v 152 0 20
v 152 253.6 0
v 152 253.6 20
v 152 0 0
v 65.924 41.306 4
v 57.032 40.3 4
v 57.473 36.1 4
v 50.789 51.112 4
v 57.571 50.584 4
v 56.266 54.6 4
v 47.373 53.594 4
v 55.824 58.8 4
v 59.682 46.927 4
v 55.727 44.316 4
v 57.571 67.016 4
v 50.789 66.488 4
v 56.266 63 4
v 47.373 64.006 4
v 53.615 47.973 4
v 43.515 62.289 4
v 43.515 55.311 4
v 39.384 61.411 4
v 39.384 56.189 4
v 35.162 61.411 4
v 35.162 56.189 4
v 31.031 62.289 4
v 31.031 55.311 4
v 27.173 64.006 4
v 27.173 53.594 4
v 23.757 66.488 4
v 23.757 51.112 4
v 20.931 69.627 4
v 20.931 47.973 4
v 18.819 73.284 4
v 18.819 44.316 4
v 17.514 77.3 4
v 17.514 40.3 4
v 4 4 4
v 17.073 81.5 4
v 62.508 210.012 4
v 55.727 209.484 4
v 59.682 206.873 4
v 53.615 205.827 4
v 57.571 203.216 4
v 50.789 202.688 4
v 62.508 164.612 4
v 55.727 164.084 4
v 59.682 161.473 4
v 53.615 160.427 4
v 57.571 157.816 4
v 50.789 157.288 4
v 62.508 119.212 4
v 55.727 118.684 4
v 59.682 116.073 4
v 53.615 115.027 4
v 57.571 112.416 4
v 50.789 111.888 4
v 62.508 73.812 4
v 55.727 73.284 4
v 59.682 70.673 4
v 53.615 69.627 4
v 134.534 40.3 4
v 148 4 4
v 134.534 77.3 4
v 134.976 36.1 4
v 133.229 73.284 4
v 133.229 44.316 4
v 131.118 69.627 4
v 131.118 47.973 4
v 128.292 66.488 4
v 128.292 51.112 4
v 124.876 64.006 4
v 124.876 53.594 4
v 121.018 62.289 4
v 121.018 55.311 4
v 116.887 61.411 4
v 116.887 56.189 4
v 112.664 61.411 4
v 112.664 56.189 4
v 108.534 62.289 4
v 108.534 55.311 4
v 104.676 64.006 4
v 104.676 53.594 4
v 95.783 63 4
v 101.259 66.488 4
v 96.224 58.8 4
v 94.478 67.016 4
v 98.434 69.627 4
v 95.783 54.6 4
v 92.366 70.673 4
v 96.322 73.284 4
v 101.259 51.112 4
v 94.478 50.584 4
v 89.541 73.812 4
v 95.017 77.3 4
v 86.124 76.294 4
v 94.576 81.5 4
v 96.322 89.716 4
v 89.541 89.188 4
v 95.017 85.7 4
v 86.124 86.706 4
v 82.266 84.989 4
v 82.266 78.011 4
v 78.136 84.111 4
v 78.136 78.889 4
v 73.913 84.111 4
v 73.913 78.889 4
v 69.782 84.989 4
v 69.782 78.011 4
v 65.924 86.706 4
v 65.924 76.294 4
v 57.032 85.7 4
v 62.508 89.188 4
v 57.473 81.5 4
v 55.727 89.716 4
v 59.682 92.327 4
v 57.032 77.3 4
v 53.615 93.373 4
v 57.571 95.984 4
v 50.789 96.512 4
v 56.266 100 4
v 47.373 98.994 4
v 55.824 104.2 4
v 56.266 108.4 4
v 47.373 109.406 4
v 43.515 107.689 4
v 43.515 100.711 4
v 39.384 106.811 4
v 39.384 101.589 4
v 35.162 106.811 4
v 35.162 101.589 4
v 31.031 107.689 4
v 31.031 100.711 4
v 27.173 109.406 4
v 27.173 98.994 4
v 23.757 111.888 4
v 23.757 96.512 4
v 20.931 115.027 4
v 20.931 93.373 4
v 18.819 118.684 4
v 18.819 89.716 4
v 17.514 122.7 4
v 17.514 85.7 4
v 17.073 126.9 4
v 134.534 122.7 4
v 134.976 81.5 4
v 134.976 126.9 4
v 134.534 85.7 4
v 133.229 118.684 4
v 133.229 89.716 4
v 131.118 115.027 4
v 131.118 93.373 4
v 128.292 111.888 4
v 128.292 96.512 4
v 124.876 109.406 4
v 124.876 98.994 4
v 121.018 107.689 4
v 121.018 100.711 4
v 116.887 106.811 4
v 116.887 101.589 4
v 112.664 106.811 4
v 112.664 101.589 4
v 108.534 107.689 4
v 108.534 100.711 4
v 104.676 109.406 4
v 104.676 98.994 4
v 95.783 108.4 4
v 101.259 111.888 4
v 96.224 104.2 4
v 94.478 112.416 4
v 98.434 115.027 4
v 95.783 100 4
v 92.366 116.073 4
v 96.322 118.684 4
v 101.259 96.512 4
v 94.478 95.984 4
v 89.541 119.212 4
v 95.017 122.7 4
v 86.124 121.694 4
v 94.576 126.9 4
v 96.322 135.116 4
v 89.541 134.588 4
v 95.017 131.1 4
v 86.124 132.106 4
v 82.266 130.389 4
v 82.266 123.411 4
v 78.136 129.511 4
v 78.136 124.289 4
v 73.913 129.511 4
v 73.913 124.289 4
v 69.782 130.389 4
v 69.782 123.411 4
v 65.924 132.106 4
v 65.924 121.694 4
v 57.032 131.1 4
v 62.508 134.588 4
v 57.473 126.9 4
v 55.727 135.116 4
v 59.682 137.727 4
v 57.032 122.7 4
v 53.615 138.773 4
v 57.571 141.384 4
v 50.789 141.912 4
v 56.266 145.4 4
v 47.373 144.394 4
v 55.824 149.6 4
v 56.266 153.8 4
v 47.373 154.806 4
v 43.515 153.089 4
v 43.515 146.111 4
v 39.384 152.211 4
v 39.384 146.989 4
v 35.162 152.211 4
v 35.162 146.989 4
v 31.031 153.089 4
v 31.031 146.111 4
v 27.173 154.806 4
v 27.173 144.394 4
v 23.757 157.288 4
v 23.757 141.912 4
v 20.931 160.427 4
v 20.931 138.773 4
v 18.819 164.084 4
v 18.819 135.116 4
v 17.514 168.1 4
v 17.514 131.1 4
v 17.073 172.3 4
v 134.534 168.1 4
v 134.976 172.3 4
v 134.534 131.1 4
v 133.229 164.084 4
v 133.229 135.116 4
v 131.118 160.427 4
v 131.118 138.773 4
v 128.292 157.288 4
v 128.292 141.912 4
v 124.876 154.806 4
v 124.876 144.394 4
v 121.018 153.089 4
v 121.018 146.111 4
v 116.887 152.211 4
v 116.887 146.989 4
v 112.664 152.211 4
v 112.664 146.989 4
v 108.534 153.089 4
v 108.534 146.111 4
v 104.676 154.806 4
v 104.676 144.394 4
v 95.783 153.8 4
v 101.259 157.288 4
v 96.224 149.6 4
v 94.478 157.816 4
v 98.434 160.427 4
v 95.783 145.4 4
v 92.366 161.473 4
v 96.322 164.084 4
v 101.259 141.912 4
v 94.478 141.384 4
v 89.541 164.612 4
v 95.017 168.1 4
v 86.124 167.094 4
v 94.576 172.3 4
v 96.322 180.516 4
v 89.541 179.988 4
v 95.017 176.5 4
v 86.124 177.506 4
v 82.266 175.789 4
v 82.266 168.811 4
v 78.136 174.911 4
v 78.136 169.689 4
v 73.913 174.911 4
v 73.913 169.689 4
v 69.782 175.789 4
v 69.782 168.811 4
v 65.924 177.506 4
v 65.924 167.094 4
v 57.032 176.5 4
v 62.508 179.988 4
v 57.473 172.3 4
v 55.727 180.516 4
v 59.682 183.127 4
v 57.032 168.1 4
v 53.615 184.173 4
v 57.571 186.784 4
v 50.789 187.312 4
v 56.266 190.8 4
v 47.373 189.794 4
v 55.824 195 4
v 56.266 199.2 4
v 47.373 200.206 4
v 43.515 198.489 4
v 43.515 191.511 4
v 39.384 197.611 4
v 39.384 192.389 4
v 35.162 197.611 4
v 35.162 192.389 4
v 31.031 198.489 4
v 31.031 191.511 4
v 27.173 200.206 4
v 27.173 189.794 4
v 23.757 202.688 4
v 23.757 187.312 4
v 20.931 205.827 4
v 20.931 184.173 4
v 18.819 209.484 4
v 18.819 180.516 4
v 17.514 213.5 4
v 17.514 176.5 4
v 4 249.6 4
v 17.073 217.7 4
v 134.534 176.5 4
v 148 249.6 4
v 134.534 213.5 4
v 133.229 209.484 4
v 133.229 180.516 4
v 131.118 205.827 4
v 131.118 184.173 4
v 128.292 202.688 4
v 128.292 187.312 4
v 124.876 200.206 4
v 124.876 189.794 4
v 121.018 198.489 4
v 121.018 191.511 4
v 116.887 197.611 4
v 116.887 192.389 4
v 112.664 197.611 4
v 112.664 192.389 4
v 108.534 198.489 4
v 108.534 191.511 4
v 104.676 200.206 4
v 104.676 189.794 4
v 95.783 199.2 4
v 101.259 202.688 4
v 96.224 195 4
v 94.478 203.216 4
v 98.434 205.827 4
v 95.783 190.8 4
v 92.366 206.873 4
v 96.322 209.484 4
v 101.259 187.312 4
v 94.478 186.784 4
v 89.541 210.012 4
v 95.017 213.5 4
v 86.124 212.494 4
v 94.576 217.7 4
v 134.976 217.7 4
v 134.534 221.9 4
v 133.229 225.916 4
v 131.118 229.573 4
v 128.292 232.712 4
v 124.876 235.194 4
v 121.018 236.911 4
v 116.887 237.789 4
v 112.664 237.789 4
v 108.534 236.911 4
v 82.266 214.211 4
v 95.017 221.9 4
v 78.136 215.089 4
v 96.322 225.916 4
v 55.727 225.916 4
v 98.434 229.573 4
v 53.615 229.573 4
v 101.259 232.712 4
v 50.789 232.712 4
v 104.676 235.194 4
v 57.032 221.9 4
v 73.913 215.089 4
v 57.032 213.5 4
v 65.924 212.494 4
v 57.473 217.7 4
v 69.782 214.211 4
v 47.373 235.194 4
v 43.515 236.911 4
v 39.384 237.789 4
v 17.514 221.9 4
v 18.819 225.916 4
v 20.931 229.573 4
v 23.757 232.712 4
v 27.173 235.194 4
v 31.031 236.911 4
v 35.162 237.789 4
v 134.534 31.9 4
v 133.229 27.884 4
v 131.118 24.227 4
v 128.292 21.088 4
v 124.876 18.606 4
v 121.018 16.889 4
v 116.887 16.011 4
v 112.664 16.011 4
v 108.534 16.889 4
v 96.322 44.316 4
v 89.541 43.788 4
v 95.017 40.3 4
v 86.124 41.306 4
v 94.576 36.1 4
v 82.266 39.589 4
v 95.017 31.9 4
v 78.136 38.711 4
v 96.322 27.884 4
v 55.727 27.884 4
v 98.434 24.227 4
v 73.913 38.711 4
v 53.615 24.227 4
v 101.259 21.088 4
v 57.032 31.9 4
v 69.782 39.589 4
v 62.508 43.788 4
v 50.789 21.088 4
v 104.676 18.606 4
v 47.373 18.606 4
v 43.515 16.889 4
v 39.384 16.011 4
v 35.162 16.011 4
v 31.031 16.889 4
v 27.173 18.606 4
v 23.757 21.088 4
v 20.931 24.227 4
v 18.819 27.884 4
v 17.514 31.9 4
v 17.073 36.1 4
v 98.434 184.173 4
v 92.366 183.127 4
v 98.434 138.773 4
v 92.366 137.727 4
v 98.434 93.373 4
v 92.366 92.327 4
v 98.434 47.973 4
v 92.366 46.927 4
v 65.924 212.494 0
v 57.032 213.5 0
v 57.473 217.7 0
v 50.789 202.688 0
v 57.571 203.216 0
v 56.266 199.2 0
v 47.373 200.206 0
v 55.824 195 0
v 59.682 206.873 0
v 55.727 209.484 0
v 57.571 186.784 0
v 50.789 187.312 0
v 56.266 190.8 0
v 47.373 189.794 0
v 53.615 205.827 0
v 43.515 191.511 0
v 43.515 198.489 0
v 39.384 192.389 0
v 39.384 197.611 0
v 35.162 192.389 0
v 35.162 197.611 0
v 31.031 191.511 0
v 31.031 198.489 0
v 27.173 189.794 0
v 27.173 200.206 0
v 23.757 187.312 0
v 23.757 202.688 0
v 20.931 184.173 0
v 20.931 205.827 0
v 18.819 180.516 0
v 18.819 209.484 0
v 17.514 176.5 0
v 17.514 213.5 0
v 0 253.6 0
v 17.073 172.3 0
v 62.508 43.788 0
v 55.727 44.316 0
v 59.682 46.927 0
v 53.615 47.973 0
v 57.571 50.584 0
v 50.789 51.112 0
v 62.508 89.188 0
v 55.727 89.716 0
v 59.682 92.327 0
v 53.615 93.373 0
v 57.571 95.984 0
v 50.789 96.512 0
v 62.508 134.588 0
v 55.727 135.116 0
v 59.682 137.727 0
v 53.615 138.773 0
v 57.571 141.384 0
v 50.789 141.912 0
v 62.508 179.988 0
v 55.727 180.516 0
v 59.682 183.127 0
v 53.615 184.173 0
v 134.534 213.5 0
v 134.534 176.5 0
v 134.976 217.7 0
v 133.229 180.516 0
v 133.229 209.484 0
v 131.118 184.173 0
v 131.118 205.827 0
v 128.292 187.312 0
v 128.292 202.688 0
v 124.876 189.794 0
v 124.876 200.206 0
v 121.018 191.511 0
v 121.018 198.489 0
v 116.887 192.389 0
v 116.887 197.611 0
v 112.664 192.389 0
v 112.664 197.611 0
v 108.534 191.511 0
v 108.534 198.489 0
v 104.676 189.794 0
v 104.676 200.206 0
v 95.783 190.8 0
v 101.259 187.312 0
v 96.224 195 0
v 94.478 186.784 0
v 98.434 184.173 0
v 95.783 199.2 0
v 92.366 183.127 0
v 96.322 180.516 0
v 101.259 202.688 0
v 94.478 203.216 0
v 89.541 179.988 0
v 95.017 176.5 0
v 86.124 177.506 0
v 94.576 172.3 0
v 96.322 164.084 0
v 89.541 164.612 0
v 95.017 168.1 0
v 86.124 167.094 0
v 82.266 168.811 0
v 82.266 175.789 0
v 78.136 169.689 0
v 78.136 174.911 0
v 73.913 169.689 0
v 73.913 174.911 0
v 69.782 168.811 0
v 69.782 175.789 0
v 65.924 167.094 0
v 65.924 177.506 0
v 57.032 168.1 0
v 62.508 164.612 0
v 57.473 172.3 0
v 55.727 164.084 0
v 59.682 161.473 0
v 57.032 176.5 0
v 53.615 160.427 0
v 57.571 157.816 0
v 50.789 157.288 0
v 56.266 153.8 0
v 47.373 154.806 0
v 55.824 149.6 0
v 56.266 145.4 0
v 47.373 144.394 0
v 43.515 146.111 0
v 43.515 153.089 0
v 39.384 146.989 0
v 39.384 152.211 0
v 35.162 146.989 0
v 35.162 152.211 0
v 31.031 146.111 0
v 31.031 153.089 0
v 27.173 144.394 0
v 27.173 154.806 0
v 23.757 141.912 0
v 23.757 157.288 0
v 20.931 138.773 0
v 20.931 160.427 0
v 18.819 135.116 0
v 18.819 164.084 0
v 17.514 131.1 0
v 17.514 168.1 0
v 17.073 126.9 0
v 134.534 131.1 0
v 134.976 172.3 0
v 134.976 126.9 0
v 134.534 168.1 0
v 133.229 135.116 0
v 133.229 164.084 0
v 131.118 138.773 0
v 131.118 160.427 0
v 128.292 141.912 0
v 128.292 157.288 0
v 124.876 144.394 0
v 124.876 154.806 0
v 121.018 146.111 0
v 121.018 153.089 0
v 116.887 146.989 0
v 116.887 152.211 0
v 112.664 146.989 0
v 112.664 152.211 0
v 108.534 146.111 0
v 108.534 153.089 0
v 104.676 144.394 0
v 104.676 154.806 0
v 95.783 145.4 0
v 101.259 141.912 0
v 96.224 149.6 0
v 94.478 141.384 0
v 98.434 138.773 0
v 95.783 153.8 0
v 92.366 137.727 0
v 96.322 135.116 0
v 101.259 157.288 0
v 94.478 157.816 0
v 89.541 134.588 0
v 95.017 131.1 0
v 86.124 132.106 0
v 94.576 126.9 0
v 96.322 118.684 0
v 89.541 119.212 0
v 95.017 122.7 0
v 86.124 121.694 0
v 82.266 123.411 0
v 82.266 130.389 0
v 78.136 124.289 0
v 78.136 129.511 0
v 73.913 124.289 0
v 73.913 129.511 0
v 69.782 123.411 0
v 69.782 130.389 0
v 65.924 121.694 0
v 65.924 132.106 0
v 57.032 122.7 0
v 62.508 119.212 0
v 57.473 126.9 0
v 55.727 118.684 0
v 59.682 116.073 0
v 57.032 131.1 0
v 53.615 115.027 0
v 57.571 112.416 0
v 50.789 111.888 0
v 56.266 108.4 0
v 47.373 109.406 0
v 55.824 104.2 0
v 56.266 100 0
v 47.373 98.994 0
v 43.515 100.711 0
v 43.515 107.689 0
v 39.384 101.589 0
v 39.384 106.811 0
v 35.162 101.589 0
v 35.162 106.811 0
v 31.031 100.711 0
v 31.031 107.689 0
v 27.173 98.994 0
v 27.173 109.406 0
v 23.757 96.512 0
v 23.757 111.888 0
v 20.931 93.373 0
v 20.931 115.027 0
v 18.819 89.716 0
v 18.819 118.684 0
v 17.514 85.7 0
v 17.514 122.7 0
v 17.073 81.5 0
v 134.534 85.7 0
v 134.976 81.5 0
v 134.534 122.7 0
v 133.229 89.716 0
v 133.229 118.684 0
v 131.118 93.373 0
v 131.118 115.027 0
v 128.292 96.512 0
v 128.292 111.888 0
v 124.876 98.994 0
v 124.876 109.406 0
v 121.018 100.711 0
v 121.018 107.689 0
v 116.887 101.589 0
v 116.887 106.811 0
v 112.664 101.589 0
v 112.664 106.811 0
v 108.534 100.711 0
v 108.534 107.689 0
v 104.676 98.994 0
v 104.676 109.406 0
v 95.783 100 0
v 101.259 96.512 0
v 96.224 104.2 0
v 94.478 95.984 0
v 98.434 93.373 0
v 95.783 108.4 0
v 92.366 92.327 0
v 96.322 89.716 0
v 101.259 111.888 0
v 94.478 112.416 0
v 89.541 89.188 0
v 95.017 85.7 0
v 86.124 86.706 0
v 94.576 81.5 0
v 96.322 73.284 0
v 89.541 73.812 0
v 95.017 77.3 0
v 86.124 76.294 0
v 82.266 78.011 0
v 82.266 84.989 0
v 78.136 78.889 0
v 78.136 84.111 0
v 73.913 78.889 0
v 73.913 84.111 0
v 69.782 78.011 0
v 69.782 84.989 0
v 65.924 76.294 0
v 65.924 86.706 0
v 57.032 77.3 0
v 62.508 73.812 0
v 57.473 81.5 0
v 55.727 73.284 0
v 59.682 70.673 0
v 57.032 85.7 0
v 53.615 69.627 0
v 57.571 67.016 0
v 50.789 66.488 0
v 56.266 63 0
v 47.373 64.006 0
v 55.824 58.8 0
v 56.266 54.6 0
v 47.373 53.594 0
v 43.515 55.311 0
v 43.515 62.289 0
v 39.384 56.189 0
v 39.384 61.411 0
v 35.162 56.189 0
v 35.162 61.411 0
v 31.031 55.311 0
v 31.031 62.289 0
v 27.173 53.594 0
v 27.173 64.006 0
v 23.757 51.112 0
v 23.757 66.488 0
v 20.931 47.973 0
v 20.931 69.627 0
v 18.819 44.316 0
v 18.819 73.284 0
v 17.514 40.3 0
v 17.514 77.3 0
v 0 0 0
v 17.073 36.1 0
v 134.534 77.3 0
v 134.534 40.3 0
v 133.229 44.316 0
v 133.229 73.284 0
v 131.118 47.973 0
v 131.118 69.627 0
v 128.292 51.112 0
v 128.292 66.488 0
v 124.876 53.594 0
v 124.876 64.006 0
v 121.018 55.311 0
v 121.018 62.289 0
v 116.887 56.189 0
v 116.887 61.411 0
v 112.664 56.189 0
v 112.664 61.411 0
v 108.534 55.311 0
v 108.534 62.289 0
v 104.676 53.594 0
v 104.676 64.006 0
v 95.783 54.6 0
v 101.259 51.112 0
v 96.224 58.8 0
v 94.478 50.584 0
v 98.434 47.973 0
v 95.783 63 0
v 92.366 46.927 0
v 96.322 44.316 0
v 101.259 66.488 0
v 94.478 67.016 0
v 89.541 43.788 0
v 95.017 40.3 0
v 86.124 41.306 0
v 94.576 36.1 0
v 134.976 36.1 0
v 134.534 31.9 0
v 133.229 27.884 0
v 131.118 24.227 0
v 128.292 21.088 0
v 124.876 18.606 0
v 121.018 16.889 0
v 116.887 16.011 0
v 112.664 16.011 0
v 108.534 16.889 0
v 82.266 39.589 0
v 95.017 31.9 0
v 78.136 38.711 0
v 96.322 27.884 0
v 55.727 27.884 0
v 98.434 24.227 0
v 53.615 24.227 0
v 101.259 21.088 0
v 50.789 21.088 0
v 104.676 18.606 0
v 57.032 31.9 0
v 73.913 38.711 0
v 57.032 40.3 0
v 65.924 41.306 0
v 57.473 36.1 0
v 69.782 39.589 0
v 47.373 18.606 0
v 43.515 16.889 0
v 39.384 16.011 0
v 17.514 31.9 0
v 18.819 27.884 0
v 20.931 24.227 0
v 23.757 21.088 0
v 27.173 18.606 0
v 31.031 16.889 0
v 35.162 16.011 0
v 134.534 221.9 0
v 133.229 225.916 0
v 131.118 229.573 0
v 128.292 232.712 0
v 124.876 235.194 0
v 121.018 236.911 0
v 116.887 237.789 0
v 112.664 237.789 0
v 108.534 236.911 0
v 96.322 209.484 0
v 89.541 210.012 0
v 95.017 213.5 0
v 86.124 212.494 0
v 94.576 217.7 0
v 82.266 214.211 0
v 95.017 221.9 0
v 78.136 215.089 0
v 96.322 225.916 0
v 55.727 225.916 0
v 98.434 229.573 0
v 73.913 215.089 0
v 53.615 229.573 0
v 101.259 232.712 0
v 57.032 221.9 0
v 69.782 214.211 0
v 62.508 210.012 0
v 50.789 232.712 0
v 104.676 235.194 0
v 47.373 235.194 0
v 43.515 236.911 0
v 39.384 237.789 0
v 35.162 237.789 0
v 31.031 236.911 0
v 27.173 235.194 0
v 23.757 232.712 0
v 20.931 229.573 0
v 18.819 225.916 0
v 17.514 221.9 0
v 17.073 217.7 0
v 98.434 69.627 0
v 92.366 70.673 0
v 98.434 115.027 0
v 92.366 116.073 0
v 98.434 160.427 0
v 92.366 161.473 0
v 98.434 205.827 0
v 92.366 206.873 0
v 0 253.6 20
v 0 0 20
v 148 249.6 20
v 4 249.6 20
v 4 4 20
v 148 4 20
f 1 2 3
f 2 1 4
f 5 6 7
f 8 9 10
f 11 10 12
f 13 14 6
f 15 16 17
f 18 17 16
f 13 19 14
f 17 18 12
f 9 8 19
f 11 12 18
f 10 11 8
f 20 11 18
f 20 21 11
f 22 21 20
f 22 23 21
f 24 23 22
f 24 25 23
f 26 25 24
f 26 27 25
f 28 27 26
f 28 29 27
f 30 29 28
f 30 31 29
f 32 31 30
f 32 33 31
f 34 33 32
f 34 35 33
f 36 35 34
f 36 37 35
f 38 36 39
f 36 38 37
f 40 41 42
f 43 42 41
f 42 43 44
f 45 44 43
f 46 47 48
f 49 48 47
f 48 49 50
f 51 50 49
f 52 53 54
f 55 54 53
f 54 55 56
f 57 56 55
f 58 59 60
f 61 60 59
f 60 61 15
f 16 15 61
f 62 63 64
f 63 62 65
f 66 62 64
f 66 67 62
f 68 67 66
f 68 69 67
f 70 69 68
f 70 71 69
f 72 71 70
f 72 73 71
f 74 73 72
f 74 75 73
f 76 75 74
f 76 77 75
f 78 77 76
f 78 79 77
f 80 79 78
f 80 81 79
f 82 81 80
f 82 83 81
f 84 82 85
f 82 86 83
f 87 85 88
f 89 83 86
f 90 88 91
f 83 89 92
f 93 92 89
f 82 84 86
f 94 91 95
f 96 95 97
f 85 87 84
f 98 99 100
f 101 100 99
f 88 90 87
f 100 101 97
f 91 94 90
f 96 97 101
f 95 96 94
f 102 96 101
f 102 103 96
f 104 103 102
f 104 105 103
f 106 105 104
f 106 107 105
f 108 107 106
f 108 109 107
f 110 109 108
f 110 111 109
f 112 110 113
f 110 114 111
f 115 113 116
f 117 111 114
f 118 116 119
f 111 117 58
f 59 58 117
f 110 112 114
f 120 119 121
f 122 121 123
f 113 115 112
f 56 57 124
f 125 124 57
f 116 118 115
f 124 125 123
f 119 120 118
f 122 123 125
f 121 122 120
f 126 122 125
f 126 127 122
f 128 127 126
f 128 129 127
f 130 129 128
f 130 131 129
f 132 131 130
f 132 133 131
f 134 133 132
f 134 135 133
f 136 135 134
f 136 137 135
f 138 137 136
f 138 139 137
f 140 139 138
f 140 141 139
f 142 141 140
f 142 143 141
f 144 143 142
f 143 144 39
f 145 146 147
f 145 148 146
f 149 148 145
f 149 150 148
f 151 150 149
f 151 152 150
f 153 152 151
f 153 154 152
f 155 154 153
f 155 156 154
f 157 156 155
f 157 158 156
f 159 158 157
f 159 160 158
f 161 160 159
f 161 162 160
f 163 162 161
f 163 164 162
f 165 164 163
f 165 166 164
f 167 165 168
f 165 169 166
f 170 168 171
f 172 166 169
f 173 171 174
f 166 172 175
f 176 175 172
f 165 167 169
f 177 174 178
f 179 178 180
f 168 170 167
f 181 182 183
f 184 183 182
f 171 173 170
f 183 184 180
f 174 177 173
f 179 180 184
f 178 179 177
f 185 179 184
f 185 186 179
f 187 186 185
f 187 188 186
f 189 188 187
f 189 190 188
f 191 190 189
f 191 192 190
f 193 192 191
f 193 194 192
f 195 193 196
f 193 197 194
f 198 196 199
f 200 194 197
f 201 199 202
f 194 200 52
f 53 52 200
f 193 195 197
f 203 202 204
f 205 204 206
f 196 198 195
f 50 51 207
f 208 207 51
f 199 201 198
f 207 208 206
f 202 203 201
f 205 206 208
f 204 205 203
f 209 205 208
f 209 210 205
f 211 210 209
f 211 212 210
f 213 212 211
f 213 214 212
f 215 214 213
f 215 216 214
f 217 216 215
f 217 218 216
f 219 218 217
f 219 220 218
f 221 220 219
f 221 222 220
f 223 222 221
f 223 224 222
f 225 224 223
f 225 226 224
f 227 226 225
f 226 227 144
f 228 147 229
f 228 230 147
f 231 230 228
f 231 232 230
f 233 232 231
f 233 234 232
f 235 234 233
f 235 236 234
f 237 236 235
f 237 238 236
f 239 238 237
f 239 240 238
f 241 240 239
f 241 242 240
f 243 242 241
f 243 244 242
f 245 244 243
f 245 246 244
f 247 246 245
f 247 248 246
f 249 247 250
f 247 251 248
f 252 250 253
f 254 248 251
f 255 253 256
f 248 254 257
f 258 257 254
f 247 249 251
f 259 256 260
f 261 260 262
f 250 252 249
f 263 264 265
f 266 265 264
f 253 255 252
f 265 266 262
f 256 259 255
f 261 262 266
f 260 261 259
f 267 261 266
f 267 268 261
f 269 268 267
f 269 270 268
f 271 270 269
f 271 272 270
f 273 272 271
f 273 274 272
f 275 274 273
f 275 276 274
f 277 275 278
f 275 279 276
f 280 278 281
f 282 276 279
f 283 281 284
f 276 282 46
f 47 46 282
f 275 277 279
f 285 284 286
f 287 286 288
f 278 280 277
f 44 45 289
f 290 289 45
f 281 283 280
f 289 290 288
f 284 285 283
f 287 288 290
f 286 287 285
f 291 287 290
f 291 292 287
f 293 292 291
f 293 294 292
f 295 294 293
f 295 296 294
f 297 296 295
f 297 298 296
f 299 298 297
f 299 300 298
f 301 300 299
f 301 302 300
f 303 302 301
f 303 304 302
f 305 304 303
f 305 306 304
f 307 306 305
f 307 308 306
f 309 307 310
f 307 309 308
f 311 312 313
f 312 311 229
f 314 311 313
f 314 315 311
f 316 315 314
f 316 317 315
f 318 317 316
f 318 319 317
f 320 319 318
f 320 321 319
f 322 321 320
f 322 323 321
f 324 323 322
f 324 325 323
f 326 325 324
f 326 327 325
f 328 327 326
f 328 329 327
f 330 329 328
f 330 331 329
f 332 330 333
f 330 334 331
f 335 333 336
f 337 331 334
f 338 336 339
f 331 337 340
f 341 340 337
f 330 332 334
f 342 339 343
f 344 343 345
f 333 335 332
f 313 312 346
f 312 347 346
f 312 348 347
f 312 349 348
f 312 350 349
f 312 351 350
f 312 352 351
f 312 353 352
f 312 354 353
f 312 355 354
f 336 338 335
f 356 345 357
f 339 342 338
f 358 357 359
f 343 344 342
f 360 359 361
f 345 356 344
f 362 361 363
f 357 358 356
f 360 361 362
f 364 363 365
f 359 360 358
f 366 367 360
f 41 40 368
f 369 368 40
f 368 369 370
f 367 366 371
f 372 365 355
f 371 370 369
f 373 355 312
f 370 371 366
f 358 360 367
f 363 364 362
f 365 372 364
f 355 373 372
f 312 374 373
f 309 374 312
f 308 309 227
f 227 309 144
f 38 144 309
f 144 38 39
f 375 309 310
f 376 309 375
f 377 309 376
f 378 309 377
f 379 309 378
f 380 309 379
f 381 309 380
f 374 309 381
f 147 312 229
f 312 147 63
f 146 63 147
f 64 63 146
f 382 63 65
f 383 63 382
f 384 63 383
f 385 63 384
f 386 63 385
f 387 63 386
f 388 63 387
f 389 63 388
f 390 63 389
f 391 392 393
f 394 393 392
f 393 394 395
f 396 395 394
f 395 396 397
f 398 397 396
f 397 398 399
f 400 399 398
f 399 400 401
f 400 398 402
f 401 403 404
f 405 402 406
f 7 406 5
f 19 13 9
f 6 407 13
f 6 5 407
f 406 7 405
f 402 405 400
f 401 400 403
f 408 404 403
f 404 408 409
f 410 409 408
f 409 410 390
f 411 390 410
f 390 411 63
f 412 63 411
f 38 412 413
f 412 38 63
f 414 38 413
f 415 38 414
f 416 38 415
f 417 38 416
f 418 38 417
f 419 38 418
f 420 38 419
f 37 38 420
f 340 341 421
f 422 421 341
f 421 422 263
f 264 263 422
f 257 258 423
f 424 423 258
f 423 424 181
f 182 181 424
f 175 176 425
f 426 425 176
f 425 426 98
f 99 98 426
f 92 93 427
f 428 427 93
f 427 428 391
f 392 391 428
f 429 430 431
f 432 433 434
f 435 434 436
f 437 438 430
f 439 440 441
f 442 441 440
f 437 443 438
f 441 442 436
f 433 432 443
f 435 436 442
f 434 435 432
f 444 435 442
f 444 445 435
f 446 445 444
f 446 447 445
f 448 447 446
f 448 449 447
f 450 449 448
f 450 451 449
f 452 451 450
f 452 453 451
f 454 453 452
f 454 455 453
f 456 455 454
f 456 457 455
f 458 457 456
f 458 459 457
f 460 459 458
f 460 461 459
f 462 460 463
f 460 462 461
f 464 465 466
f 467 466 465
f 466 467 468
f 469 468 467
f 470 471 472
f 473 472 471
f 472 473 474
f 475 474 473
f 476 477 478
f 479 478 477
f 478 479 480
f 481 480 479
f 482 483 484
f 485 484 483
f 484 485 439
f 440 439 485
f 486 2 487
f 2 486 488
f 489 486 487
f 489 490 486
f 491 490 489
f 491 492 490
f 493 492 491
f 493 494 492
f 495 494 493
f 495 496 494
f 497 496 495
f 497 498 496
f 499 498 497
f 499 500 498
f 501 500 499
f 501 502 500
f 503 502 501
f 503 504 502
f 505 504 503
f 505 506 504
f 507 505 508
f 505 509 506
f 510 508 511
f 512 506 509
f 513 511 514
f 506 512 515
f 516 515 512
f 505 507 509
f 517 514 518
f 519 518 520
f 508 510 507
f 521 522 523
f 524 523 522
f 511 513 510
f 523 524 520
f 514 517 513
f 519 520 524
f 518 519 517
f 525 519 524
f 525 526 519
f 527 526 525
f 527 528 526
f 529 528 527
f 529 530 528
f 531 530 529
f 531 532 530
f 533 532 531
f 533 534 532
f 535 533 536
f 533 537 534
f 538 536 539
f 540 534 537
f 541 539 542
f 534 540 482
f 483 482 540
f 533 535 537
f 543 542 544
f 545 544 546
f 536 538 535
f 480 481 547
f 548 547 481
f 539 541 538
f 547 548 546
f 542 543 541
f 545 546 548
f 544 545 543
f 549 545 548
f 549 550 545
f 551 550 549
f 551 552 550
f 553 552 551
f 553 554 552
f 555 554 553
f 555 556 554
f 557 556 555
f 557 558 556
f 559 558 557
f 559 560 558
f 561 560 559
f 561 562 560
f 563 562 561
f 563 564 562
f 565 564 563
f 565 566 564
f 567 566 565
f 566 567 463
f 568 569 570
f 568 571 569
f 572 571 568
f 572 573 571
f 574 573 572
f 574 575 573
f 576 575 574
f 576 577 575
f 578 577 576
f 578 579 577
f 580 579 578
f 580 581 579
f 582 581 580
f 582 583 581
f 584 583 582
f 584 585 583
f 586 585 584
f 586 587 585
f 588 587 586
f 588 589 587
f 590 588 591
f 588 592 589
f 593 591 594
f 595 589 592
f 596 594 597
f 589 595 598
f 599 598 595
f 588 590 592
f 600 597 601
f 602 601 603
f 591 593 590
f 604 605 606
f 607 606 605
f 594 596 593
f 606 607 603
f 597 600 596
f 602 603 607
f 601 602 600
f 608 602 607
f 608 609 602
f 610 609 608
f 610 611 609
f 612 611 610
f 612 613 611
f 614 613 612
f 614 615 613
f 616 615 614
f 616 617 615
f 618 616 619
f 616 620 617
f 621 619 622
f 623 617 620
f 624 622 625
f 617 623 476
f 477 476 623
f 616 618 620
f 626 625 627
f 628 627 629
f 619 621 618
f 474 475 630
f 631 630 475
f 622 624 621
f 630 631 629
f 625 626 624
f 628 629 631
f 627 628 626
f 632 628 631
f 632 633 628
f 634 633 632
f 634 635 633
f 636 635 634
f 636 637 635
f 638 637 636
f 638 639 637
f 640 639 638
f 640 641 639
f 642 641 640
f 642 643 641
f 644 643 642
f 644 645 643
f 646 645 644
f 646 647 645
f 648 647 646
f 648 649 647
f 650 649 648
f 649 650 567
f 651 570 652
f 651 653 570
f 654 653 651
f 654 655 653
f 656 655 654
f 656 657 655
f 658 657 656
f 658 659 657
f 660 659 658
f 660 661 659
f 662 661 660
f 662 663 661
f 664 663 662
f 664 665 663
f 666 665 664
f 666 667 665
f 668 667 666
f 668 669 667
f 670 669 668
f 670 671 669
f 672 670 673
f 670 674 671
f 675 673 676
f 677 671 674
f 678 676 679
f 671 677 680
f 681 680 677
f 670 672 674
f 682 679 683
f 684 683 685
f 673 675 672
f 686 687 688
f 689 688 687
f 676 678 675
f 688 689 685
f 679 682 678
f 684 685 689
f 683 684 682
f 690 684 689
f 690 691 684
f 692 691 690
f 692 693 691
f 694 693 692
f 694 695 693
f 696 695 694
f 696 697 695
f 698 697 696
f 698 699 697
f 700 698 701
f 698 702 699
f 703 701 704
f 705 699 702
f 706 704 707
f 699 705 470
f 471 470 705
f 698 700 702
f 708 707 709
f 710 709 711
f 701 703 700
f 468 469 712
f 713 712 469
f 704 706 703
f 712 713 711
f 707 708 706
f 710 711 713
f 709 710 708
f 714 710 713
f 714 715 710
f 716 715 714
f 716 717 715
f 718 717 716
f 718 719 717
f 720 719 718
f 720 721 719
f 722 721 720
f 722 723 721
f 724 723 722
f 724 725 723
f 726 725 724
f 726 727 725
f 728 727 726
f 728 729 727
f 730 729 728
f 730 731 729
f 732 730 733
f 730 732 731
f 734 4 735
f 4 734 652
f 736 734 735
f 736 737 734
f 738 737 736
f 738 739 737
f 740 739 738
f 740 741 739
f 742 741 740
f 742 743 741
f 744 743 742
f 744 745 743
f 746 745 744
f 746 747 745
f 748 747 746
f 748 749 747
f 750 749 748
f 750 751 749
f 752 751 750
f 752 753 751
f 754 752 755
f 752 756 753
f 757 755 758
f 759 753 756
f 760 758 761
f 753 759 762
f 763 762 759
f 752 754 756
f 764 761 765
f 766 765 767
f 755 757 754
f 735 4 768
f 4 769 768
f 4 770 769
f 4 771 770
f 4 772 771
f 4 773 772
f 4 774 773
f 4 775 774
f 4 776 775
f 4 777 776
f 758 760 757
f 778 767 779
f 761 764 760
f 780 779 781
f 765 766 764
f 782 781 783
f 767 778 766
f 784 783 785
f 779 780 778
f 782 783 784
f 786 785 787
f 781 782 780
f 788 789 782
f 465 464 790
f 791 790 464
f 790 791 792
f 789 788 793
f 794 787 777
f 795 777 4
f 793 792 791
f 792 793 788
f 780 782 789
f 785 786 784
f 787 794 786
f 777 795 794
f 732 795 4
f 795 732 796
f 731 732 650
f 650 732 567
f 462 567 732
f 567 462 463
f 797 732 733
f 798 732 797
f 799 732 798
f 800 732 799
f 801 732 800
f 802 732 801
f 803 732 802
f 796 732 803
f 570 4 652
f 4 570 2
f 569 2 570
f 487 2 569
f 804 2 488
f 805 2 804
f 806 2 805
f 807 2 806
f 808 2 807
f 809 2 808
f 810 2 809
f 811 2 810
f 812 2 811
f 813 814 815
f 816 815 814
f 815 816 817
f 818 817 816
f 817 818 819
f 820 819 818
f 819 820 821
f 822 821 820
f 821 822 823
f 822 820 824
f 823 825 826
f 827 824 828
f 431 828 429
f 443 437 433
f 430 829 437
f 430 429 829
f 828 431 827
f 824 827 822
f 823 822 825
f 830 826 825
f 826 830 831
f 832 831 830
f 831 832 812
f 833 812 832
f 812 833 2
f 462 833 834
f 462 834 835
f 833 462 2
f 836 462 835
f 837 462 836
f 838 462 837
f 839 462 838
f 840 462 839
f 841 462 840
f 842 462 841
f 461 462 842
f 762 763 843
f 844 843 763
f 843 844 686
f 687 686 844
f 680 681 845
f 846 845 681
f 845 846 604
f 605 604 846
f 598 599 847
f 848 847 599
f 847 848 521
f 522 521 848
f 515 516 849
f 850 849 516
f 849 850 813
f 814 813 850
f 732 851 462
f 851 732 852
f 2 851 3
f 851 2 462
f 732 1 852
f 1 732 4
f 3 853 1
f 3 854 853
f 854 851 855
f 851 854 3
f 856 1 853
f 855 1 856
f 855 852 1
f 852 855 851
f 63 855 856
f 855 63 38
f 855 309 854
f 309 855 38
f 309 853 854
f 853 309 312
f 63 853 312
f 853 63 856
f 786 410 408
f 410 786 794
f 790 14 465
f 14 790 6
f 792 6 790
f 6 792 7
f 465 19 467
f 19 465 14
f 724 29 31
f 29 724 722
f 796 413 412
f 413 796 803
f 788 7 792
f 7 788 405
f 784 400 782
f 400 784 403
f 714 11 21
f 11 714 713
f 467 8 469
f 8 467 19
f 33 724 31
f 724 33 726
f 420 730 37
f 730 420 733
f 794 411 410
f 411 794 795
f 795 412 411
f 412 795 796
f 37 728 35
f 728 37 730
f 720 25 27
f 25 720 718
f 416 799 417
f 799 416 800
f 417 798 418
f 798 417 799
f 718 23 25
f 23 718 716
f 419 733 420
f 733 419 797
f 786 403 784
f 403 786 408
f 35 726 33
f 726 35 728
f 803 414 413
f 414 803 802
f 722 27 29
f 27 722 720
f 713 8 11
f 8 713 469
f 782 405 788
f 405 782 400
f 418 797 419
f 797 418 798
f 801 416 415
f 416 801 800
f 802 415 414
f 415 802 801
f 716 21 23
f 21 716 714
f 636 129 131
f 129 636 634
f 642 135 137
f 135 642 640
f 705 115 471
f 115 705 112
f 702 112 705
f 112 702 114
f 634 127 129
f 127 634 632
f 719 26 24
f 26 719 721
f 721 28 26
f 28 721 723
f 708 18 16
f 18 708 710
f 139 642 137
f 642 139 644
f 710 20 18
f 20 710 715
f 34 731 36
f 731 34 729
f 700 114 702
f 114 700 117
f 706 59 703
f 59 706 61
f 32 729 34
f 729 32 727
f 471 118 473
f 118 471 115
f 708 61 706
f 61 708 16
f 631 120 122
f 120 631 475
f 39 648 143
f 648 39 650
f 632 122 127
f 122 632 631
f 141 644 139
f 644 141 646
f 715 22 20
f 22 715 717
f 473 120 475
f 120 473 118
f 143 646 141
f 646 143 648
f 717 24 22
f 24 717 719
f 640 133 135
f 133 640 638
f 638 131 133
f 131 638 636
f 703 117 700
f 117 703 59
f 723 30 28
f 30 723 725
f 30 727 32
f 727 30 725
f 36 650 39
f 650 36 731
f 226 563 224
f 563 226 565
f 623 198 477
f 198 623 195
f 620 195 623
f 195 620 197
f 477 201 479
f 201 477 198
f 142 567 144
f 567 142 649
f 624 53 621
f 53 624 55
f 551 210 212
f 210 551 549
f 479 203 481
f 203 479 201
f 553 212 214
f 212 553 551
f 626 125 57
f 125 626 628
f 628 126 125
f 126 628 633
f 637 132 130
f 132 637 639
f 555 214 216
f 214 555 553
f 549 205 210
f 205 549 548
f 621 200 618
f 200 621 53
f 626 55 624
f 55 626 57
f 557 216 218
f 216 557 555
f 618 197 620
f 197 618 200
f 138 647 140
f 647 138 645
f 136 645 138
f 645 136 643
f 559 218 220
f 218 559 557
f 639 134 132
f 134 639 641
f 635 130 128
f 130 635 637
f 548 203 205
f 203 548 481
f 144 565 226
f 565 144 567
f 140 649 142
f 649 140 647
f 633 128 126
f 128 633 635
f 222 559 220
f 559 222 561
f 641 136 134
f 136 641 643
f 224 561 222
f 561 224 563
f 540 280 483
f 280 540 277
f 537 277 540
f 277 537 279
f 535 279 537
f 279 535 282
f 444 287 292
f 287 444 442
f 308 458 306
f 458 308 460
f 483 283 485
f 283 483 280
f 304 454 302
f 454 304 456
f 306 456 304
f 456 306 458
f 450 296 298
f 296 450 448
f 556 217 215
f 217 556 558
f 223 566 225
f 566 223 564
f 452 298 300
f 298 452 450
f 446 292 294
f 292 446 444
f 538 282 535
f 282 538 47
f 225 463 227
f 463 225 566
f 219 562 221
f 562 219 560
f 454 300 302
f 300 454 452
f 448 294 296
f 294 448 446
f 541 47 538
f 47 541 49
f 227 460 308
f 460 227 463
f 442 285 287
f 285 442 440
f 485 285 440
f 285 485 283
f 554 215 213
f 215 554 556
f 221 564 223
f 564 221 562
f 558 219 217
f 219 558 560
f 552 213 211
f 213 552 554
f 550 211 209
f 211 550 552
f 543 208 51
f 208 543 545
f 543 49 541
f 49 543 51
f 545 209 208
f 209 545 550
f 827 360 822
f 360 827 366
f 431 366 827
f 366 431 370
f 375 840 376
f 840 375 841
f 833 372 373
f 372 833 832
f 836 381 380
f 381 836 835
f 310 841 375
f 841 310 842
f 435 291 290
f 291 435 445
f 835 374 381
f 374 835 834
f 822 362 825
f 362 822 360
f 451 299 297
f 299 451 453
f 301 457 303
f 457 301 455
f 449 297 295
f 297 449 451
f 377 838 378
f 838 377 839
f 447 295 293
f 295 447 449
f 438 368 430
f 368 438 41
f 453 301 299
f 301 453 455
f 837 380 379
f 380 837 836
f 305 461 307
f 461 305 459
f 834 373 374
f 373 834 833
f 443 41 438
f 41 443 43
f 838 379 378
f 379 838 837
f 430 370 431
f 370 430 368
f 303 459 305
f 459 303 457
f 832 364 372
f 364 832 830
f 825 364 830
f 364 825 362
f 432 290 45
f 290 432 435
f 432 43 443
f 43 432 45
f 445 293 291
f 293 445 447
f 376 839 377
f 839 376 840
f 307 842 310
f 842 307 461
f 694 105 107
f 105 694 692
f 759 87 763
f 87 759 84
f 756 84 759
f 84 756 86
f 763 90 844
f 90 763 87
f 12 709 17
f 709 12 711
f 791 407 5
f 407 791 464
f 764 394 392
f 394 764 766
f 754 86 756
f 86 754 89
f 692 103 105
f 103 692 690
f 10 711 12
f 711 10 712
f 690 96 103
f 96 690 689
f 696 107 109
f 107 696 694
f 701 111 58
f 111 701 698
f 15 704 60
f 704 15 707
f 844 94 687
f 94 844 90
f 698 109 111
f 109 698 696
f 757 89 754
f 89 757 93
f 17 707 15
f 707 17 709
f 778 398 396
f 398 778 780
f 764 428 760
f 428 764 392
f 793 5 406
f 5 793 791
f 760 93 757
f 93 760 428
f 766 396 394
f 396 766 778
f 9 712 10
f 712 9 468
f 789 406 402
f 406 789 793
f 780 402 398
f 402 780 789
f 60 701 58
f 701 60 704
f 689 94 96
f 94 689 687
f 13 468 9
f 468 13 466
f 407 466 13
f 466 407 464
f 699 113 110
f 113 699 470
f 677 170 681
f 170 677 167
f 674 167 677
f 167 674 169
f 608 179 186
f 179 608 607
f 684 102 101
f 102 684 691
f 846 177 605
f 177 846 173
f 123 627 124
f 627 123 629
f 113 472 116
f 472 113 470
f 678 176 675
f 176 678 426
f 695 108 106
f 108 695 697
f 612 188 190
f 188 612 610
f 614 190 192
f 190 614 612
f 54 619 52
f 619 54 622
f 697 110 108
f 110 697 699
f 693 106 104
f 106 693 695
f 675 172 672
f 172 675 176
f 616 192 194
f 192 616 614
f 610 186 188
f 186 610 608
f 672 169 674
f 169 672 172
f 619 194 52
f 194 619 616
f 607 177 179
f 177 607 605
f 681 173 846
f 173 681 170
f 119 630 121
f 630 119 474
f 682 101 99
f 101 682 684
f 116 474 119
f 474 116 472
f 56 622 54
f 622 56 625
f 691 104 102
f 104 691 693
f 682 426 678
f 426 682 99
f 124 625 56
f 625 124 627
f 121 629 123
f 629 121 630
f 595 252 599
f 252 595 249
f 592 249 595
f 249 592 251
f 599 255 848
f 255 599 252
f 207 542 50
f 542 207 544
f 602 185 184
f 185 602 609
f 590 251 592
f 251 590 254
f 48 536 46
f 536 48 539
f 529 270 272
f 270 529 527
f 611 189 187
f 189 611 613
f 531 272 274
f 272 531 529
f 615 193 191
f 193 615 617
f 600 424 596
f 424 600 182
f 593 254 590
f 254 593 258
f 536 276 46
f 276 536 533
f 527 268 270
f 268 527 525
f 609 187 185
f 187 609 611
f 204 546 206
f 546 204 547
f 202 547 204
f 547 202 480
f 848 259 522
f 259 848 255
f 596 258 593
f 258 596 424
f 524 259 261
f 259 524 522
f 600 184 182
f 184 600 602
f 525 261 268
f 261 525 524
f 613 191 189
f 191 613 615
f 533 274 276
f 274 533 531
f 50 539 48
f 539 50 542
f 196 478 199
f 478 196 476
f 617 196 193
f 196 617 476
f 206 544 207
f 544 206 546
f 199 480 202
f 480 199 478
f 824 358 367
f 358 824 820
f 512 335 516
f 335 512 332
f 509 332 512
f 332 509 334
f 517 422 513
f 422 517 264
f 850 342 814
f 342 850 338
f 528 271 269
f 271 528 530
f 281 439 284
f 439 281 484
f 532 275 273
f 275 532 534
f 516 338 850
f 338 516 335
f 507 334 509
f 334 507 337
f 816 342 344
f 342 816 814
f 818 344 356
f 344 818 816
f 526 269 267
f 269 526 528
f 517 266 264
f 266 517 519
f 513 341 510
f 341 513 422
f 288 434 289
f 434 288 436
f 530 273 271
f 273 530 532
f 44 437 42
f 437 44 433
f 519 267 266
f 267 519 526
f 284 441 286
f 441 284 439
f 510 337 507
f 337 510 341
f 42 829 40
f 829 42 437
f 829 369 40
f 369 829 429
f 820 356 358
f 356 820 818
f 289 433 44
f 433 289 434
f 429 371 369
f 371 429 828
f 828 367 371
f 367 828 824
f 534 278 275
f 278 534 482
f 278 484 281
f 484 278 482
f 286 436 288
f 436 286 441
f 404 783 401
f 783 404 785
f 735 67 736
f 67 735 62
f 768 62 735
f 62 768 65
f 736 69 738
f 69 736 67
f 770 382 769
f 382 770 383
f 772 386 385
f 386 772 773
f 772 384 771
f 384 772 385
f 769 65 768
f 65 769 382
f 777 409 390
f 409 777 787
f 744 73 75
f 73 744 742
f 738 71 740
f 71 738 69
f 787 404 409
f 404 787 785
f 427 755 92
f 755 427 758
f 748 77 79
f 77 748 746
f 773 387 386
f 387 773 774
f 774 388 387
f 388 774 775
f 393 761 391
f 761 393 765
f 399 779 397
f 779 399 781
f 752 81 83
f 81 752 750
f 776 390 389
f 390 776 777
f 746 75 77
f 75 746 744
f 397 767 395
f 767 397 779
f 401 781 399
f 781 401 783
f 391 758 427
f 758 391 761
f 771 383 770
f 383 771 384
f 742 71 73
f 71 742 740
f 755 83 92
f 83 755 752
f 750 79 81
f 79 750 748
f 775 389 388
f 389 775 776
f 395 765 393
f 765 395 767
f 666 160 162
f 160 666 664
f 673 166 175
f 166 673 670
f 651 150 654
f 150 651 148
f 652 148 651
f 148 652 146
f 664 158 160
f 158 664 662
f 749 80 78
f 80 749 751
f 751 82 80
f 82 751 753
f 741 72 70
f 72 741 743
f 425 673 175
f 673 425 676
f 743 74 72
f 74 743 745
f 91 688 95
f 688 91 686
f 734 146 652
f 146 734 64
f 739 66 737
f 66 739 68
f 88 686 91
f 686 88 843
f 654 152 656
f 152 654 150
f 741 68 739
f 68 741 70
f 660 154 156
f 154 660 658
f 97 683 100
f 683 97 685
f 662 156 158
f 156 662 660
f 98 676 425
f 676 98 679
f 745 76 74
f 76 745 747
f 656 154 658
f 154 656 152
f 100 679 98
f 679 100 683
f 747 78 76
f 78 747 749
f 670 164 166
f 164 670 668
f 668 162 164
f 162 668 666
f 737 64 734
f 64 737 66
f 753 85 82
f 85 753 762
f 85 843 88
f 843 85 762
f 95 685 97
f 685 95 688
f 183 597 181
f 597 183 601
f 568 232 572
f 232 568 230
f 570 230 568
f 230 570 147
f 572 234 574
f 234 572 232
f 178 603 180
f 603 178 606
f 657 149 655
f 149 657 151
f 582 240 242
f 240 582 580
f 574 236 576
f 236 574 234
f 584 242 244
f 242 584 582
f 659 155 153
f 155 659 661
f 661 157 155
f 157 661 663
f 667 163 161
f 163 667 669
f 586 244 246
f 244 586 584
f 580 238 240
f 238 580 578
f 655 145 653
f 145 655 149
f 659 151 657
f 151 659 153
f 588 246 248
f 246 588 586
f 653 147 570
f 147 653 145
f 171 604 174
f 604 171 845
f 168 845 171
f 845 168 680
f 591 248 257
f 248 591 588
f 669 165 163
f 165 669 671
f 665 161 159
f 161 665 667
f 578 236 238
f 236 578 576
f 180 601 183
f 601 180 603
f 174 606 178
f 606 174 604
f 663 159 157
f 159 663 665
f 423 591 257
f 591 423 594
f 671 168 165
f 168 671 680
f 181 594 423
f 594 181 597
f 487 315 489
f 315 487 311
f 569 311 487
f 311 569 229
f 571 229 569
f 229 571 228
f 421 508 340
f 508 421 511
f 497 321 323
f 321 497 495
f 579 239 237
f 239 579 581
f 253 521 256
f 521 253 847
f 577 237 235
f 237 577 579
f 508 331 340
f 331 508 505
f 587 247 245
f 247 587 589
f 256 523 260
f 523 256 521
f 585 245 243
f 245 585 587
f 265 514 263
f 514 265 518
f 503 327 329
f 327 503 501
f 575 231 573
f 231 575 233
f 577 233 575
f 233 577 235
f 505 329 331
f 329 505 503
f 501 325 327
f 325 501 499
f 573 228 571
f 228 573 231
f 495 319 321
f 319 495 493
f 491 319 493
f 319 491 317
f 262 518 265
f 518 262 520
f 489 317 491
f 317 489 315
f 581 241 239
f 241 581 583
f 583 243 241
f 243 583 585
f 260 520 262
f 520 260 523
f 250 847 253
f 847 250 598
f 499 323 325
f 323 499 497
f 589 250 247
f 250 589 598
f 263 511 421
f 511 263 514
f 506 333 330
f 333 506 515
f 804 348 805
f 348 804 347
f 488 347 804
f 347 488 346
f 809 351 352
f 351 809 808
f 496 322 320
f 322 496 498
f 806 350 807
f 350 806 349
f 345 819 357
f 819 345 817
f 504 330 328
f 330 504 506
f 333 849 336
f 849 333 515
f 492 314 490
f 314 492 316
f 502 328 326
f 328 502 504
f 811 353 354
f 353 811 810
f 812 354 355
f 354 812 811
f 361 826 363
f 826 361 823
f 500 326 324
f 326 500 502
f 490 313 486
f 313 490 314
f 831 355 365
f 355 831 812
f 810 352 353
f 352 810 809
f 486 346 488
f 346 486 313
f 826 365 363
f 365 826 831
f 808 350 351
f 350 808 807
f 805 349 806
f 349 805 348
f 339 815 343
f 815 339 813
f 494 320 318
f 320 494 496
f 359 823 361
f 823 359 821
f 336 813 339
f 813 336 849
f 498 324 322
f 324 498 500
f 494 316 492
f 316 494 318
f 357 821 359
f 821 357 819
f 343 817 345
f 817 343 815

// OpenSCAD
// Useful function if you're measuring in inches
function in_to_mm(in) = in * 25.4;

// Platform sizing measurements
w = in_to_mm(6); // Width of inside of drawer
l = in_to_mm(10); // Length of shelf
d = 20; // Height of the feet

// Hole spacing measurements
slot = 40; // Size of the holes
spacing = 5; // Space between each of the holes
border = 10; // Minimum space between the edge walls and the closest holes

// Config
tolerance = 0.4; // Offset sizing to fix discrepancy between measured and printed object
// ^^ Recommended to be nozzle/extrusion width
wall = 4; // Width of solids

// ----------------------- Shouldn't need to change anything below this line. ----------------------
slot_t = slot + tolerance;
platform_w = w - tolerance;
platform_l = l - tolerance;

// Offset/fix for thin walls
rerr = 0.01;

module platform() {
  // Base
  cube([platform_w, platform_l, wall]);

  // Walls
  cube([platform_w, wall, d]);
  cube([wall, platform_l, d]);

  translate([0, platform_l-wall, 0])
  cube([platform_w, wall, d]);

  translate([platform_w-wall, 0, 0])
  cube([wall, platform_l, d]);
}

module slots() {
  slot_spacing = slot_t + spacing;
  echo(str("slot_spacing = ", slot_spacing));
  profile_x_offset = (slot_spacing + (cos(45)*slot_spacing))/2;
  echo(str("profile_x_offset = ", profile_x_offset));

  profile_w = profile_x_offset;
  echo(str("profile_w = ", profile_w));
  profile_l = slot_spacing;
  echo(str("profile_l = ", profile_l));

  inside_w = platform_w - (wall*2);
  echo(str("inside_w = ", inside_w));
  inside_l = platform_l - (wall*2);
  echo(str("inside_l = ", inside_l));

  w_steps = floor((inside_w - border) / profile_w);
  echo(str("w_steps = ", w_steps));
  l_steps = floor((inside_l - border) / profile_l);
  echo(str("l_steps = ", l_steps));

  w_offset = (inside_w - (w_steps*profile_w))/2;
  echo(str("w_offset = ", w_offset));
  l_offset = (inside_l - (l_steps*profile_l))/2;
  echo(str("l_offset = ", l_offset));

  align_x = wall - 0.8 + w_offset + slot_t/2;
  echo(str("align_x = ", align_x));
  align_y = wall*2 - 1.4 + l_offset + slot_t/2;
  echo(str("align_y = ", align_y));

  for (x=[0:w_steps-1]) {
    for (y=[0:l_steps-1]) {
      offset = (x % 2 == 0) ? 0 : slot_spacing/2;

      if (!(offset > 0 && y == l_steps - 1)) { // Doesn't cut the top hole when the holes are offset
        translate([align_x + (x*profile_x_offset), align_y + (y*slot_spacing) + offset, 0]) {
          cylinder(r=slot_t/2, h=wall+rerr*2);
        }
      }
    }
  }
}

difference() {
  platform();

  translate([0, 0, -rerr])
  slots();
}
